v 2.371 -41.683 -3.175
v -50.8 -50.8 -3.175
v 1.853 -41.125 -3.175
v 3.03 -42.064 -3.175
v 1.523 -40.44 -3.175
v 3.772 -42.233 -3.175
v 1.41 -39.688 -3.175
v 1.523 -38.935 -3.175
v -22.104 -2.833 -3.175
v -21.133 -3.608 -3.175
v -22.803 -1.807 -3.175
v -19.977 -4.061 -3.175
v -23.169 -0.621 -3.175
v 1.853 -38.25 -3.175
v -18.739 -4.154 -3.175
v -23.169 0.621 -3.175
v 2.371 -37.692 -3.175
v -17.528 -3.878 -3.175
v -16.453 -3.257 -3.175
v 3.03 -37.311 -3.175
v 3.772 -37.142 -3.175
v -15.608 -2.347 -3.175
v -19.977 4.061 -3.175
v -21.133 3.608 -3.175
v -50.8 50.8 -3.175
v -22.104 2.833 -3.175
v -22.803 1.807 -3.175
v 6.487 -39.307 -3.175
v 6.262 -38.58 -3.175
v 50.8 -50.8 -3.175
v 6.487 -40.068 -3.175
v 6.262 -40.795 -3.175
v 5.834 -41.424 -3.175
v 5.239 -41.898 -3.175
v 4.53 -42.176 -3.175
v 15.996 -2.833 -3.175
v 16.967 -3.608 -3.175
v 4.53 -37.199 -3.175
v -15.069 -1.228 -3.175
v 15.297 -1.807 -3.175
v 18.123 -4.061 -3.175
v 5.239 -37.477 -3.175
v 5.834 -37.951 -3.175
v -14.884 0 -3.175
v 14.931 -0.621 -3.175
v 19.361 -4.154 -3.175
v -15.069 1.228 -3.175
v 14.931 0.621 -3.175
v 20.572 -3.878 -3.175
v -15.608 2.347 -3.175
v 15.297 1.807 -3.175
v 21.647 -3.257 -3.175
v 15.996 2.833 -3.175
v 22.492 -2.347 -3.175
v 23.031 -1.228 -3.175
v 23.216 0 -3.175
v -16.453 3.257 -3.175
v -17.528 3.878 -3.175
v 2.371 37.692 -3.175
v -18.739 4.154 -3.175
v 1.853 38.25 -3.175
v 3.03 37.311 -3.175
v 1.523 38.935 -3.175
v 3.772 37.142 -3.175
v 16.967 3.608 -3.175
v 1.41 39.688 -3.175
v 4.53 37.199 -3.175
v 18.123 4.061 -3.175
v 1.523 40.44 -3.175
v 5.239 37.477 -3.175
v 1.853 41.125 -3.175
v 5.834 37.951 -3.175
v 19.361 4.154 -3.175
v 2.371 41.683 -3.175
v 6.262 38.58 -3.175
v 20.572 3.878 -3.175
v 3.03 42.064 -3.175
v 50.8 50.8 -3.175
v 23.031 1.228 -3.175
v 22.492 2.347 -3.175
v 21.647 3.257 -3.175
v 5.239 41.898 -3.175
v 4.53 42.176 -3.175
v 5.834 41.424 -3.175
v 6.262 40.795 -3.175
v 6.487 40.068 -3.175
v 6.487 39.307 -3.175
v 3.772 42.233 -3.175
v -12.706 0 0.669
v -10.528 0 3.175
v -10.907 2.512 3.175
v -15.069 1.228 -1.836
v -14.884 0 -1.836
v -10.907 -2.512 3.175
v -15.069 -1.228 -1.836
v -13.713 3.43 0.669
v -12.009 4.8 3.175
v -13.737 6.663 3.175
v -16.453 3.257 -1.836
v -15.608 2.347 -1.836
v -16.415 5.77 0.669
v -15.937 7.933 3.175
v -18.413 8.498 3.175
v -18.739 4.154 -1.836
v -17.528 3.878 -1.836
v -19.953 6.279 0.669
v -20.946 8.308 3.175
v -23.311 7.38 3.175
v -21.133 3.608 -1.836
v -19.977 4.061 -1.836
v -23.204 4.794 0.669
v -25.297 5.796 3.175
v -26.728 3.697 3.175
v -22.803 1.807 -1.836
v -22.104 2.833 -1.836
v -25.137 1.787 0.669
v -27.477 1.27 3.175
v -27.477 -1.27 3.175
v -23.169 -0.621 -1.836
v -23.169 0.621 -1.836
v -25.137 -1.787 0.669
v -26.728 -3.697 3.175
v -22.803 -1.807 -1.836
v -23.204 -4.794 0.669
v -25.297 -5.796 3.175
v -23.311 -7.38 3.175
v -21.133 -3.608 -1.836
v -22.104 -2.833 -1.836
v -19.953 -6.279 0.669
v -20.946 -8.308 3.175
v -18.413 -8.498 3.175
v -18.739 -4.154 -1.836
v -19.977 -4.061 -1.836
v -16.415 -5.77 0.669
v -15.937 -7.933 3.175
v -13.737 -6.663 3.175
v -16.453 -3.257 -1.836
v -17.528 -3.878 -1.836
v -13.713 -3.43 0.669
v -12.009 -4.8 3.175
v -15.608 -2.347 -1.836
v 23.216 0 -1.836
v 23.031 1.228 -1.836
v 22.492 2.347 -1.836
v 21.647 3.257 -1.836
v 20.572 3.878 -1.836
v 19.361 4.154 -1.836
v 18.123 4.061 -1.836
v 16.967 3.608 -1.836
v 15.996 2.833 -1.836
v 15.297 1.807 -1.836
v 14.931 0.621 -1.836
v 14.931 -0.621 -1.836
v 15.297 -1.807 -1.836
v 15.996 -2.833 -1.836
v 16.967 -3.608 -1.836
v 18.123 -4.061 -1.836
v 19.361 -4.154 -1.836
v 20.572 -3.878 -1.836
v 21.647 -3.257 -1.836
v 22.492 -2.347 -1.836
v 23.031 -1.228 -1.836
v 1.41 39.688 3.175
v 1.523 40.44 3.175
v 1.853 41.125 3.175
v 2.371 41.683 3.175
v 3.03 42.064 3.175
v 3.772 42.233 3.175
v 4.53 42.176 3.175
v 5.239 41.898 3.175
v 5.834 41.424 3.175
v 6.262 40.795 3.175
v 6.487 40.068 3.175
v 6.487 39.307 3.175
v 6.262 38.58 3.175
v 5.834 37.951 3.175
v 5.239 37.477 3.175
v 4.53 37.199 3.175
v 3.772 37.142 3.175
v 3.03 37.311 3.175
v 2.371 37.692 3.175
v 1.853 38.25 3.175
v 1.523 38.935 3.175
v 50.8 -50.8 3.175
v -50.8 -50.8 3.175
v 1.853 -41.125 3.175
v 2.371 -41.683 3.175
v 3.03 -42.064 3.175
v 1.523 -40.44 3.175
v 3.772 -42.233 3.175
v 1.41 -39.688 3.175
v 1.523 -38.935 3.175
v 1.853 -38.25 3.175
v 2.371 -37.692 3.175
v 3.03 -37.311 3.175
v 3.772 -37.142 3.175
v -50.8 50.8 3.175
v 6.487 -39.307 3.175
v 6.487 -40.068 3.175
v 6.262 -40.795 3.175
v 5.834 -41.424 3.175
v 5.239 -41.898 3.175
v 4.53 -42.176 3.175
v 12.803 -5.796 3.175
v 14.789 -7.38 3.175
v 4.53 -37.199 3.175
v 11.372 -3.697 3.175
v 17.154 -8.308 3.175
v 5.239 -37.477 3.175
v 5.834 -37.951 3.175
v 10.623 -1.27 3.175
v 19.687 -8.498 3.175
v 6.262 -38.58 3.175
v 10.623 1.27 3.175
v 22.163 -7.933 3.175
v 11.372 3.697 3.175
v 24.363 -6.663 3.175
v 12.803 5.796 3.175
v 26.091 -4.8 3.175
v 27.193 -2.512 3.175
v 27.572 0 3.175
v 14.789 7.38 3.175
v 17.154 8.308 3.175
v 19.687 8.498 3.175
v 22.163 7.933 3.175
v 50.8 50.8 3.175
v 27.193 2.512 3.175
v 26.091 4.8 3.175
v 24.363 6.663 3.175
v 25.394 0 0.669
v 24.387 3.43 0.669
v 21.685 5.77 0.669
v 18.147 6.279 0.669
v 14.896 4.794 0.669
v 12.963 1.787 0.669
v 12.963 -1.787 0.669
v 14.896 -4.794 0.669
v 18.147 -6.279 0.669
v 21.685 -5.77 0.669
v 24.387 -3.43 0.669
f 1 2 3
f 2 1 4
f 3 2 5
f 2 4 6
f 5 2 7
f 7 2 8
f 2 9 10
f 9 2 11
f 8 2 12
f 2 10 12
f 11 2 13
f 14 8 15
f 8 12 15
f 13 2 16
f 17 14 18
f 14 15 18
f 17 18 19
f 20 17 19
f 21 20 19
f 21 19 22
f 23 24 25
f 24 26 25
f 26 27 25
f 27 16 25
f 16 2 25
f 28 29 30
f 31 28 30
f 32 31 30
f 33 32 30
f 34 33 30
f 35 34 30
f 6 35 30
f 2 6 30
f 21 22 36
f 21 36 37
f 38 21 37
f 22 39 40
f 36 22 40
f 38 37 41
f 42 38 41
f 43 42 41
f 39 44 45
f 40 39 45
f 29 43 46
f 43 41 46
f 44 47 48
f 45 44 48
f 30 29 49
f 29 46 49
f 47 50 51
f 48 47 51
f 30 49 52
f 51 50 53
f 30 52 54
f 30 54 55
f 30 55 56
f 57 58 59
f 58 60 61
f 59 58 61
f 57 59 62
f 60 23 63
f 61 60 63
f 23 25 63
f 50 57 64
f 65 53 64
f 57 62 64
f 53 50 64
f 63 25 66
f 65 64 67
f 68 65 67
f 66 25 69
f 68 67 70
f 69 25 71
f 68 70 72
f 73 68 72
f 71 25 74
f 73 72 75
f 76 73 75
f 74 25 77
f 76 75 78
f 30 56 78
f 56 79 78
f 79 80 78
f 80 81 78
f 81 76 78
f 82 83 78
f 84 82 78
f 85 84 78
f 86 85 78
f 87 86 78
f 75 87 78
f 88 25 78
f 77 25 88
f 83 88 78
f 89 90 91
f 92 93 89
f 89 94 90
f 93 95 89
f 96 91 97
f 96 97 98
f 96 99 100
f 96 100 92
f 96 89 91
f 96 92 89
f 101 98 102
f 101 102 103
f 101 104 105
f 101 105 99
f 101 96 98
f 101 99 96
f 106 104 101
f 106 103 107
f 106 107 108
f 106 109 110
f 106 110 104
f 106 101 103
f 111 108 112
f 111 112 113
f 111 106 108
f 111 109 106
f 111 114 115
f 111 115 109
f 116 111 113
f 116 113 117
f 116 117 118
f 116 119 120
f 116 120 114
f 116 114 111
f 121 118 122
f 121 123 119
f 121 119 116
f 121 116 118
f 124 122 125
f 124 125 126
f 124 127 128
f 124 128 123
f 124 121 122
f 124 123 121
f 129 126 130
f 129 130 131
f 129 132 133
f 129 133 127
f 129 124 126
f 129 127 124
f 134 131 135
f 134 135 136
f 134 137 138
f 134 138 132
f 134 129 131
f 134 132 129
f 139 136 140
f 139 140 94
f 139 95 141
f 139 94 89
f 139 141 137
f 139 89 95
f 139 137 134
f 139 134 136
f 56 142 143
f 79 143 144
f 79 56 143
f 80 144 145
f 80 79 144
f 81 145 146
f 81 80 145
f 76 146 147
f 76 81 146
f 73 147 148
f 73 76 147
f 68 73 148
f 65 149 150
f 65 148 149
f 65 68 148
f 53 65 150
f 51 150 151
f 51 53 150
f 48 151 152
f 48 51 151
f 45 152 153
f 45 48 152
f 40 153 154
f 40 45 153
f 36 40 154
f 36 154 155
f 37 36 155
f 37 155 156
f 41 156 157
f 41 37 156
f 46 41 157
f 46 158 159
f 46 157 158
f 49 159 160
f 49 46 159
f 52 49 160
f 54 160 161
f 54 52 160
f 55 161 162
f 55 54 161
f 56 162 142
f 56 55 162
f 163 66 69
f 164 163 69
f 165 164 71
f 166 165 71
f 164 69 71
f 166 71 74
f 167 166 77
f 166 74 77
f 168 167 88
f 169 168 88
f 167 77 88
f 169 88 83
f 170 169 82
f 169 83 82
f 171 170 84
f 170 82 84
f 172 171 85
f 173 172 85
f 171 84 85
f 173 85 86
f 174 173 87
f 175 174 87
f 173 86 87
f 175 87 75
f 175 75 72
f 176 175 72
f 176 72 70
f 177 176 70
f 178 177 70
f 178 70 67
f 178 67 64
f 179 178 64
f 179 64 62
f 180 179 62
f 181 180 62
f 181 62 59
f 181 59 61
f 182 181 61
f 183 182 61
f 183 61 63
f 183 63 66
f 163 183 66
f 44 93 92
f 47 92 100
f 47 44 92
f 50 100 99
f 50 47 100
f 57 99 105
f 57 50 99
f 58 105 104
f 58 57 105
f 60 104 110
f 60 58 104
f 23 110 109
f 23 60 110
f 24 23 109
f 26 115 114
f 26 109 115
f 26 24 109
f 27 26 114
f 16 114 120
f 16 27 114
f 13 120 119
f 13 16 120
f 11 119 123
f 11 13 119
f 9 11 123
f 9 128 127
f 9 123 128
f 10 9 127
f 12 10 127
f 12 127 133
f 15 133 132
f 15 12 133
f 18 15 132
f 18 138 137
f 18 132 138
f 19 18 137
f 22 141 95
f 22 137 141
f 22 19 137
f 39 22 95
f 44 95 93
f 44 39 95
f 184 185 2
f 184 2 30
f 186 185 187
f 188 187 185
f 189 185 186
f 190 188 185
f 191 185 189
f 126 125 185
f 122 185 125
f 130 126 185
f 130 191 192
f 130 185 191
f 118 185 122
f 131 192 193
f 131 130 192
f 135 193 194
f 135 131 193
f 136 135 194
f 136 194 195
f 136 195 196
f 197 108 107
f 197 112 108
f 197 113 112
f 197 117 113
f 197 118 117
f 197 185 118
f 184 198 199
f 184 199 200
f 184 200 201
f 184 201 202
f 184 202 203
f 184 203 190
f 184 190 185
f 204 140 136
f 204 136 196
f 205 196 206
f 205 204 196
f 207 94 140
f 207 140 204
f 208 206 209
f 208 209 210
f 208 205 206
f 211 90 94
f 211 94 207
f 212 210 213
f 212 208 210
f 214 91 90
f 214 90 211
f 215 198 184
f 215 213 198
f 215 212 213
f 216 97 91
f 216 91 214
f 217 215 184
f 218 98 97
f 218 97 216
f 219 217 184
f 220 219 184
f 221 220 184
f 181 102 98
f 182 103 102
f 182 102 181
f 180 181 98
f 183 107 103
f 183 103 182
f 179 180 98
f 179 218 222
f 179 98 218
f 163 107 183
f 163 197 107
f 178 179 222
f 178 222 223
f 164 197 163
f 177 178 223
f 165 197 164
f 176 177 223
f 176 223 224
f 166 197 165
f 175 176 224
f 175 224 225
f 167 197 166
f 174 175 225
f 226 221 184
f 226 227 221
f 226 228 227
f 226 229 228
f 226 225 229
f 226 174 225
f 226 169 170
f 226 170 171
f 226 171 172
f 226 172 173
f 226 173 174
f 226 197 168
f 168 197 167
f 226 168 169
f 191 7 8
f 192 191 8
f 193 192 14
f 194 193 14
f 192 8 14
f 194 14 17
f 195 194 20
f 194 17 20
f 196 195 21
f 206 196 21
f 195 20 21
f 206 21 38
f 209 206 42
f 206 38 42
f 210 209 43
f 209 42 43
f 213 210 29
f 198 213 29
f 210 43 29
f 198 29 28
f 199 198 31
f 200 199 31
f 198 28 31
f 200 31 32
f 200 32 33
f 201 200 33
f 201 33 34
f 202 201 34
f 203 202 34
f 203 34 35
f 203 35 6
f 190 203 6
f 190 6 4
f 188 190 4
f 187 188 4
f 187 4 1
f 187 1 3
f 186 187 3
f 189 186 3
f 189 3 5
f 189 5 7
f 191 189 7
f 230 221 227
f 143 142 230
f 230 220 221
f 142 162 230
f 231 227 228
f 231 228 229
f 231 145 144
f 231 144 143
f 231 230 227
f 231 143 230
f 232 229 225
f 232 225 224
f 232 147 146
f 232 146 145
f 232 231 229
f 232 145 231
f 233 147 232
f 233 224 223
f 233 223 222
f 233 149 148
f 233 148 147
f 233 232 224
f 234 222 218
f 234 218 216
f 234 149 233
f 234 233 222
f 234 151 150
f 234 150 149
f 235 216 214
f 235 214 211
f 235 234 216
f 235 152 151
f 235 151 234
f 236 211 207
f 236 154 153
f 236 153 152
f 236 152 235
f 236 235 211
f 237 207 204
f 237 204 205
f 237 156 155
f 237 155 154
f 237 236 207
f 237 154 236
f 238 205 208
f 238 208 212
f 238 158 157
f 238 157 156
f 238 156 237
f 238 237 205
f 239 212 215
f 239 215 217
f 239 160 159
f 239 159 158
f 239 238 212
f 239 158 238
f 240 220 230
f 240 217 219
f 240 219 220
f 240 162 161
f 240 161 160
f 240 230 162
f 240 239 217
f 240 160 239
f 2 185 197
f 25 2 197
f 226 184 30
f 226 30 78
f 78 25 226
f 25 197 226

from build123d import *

# Parameters (mm, degrees)
SKETCH1_W               = 101.6
SKETCH1_H               = 101.6
SKETCH1_R               = 4.1656
BOSS_EXTRUDE1_DEPTH     = 3.175
F_1_4_20_TAPPED_HOLE1_D = 5.1054


with BuildPart() as part:
    # Sketch1 → Boss-Extrude1 (new, symmetric)
    with BuildSketch(Plane.XY):
        Rectangle(SKETCH1_W, SKETCH1_H)
        with Locations((-19.05, 0)):
            Circle(SKETCH1_R, mode=Mode.SUBTRACT)
        with Locations((19.05, 0)):
            Circle(SKETCH1_R, mode=Mode.SUBTRACT)
    extrude(amount=BOSS_EXTRUDE1_DEPTH, both=True)

    # Sketch2 → Cut-Revolve1 (revolve, cut)
    with BuildSketch(Plane(origin=(0, 0, 0), x_dir=(1, 0, 0), z_dir=(0, 1, 0))):
        Polygon((-10.5283, -3.175), (-19.05, 6.628094456), (-19.05, -3.175), align=None)
    cut_revolve1 = revolve(axis=Axis((-19.05, 0, -6.628094456), (0, 0, 1)), mode=Mode.SUBTRACT)

    # Sketch-Pattern1: Cut-Revolve1 at 1 more place
    with Locations((38.1, 0, 0)):
        add(cut_revolve1, mode=Mode.SUBTRACT)

    # 1/4-20 Tapped Hole1 (through all)
    with Locations(Plane.XY.offset(3.175)):
        with Locations((3.9624, -39.6875), (3.9624, 39.6875)):
            Hole(F_1_4_20_TAPPED_HOLE1_D / 2)


solid = part.part
